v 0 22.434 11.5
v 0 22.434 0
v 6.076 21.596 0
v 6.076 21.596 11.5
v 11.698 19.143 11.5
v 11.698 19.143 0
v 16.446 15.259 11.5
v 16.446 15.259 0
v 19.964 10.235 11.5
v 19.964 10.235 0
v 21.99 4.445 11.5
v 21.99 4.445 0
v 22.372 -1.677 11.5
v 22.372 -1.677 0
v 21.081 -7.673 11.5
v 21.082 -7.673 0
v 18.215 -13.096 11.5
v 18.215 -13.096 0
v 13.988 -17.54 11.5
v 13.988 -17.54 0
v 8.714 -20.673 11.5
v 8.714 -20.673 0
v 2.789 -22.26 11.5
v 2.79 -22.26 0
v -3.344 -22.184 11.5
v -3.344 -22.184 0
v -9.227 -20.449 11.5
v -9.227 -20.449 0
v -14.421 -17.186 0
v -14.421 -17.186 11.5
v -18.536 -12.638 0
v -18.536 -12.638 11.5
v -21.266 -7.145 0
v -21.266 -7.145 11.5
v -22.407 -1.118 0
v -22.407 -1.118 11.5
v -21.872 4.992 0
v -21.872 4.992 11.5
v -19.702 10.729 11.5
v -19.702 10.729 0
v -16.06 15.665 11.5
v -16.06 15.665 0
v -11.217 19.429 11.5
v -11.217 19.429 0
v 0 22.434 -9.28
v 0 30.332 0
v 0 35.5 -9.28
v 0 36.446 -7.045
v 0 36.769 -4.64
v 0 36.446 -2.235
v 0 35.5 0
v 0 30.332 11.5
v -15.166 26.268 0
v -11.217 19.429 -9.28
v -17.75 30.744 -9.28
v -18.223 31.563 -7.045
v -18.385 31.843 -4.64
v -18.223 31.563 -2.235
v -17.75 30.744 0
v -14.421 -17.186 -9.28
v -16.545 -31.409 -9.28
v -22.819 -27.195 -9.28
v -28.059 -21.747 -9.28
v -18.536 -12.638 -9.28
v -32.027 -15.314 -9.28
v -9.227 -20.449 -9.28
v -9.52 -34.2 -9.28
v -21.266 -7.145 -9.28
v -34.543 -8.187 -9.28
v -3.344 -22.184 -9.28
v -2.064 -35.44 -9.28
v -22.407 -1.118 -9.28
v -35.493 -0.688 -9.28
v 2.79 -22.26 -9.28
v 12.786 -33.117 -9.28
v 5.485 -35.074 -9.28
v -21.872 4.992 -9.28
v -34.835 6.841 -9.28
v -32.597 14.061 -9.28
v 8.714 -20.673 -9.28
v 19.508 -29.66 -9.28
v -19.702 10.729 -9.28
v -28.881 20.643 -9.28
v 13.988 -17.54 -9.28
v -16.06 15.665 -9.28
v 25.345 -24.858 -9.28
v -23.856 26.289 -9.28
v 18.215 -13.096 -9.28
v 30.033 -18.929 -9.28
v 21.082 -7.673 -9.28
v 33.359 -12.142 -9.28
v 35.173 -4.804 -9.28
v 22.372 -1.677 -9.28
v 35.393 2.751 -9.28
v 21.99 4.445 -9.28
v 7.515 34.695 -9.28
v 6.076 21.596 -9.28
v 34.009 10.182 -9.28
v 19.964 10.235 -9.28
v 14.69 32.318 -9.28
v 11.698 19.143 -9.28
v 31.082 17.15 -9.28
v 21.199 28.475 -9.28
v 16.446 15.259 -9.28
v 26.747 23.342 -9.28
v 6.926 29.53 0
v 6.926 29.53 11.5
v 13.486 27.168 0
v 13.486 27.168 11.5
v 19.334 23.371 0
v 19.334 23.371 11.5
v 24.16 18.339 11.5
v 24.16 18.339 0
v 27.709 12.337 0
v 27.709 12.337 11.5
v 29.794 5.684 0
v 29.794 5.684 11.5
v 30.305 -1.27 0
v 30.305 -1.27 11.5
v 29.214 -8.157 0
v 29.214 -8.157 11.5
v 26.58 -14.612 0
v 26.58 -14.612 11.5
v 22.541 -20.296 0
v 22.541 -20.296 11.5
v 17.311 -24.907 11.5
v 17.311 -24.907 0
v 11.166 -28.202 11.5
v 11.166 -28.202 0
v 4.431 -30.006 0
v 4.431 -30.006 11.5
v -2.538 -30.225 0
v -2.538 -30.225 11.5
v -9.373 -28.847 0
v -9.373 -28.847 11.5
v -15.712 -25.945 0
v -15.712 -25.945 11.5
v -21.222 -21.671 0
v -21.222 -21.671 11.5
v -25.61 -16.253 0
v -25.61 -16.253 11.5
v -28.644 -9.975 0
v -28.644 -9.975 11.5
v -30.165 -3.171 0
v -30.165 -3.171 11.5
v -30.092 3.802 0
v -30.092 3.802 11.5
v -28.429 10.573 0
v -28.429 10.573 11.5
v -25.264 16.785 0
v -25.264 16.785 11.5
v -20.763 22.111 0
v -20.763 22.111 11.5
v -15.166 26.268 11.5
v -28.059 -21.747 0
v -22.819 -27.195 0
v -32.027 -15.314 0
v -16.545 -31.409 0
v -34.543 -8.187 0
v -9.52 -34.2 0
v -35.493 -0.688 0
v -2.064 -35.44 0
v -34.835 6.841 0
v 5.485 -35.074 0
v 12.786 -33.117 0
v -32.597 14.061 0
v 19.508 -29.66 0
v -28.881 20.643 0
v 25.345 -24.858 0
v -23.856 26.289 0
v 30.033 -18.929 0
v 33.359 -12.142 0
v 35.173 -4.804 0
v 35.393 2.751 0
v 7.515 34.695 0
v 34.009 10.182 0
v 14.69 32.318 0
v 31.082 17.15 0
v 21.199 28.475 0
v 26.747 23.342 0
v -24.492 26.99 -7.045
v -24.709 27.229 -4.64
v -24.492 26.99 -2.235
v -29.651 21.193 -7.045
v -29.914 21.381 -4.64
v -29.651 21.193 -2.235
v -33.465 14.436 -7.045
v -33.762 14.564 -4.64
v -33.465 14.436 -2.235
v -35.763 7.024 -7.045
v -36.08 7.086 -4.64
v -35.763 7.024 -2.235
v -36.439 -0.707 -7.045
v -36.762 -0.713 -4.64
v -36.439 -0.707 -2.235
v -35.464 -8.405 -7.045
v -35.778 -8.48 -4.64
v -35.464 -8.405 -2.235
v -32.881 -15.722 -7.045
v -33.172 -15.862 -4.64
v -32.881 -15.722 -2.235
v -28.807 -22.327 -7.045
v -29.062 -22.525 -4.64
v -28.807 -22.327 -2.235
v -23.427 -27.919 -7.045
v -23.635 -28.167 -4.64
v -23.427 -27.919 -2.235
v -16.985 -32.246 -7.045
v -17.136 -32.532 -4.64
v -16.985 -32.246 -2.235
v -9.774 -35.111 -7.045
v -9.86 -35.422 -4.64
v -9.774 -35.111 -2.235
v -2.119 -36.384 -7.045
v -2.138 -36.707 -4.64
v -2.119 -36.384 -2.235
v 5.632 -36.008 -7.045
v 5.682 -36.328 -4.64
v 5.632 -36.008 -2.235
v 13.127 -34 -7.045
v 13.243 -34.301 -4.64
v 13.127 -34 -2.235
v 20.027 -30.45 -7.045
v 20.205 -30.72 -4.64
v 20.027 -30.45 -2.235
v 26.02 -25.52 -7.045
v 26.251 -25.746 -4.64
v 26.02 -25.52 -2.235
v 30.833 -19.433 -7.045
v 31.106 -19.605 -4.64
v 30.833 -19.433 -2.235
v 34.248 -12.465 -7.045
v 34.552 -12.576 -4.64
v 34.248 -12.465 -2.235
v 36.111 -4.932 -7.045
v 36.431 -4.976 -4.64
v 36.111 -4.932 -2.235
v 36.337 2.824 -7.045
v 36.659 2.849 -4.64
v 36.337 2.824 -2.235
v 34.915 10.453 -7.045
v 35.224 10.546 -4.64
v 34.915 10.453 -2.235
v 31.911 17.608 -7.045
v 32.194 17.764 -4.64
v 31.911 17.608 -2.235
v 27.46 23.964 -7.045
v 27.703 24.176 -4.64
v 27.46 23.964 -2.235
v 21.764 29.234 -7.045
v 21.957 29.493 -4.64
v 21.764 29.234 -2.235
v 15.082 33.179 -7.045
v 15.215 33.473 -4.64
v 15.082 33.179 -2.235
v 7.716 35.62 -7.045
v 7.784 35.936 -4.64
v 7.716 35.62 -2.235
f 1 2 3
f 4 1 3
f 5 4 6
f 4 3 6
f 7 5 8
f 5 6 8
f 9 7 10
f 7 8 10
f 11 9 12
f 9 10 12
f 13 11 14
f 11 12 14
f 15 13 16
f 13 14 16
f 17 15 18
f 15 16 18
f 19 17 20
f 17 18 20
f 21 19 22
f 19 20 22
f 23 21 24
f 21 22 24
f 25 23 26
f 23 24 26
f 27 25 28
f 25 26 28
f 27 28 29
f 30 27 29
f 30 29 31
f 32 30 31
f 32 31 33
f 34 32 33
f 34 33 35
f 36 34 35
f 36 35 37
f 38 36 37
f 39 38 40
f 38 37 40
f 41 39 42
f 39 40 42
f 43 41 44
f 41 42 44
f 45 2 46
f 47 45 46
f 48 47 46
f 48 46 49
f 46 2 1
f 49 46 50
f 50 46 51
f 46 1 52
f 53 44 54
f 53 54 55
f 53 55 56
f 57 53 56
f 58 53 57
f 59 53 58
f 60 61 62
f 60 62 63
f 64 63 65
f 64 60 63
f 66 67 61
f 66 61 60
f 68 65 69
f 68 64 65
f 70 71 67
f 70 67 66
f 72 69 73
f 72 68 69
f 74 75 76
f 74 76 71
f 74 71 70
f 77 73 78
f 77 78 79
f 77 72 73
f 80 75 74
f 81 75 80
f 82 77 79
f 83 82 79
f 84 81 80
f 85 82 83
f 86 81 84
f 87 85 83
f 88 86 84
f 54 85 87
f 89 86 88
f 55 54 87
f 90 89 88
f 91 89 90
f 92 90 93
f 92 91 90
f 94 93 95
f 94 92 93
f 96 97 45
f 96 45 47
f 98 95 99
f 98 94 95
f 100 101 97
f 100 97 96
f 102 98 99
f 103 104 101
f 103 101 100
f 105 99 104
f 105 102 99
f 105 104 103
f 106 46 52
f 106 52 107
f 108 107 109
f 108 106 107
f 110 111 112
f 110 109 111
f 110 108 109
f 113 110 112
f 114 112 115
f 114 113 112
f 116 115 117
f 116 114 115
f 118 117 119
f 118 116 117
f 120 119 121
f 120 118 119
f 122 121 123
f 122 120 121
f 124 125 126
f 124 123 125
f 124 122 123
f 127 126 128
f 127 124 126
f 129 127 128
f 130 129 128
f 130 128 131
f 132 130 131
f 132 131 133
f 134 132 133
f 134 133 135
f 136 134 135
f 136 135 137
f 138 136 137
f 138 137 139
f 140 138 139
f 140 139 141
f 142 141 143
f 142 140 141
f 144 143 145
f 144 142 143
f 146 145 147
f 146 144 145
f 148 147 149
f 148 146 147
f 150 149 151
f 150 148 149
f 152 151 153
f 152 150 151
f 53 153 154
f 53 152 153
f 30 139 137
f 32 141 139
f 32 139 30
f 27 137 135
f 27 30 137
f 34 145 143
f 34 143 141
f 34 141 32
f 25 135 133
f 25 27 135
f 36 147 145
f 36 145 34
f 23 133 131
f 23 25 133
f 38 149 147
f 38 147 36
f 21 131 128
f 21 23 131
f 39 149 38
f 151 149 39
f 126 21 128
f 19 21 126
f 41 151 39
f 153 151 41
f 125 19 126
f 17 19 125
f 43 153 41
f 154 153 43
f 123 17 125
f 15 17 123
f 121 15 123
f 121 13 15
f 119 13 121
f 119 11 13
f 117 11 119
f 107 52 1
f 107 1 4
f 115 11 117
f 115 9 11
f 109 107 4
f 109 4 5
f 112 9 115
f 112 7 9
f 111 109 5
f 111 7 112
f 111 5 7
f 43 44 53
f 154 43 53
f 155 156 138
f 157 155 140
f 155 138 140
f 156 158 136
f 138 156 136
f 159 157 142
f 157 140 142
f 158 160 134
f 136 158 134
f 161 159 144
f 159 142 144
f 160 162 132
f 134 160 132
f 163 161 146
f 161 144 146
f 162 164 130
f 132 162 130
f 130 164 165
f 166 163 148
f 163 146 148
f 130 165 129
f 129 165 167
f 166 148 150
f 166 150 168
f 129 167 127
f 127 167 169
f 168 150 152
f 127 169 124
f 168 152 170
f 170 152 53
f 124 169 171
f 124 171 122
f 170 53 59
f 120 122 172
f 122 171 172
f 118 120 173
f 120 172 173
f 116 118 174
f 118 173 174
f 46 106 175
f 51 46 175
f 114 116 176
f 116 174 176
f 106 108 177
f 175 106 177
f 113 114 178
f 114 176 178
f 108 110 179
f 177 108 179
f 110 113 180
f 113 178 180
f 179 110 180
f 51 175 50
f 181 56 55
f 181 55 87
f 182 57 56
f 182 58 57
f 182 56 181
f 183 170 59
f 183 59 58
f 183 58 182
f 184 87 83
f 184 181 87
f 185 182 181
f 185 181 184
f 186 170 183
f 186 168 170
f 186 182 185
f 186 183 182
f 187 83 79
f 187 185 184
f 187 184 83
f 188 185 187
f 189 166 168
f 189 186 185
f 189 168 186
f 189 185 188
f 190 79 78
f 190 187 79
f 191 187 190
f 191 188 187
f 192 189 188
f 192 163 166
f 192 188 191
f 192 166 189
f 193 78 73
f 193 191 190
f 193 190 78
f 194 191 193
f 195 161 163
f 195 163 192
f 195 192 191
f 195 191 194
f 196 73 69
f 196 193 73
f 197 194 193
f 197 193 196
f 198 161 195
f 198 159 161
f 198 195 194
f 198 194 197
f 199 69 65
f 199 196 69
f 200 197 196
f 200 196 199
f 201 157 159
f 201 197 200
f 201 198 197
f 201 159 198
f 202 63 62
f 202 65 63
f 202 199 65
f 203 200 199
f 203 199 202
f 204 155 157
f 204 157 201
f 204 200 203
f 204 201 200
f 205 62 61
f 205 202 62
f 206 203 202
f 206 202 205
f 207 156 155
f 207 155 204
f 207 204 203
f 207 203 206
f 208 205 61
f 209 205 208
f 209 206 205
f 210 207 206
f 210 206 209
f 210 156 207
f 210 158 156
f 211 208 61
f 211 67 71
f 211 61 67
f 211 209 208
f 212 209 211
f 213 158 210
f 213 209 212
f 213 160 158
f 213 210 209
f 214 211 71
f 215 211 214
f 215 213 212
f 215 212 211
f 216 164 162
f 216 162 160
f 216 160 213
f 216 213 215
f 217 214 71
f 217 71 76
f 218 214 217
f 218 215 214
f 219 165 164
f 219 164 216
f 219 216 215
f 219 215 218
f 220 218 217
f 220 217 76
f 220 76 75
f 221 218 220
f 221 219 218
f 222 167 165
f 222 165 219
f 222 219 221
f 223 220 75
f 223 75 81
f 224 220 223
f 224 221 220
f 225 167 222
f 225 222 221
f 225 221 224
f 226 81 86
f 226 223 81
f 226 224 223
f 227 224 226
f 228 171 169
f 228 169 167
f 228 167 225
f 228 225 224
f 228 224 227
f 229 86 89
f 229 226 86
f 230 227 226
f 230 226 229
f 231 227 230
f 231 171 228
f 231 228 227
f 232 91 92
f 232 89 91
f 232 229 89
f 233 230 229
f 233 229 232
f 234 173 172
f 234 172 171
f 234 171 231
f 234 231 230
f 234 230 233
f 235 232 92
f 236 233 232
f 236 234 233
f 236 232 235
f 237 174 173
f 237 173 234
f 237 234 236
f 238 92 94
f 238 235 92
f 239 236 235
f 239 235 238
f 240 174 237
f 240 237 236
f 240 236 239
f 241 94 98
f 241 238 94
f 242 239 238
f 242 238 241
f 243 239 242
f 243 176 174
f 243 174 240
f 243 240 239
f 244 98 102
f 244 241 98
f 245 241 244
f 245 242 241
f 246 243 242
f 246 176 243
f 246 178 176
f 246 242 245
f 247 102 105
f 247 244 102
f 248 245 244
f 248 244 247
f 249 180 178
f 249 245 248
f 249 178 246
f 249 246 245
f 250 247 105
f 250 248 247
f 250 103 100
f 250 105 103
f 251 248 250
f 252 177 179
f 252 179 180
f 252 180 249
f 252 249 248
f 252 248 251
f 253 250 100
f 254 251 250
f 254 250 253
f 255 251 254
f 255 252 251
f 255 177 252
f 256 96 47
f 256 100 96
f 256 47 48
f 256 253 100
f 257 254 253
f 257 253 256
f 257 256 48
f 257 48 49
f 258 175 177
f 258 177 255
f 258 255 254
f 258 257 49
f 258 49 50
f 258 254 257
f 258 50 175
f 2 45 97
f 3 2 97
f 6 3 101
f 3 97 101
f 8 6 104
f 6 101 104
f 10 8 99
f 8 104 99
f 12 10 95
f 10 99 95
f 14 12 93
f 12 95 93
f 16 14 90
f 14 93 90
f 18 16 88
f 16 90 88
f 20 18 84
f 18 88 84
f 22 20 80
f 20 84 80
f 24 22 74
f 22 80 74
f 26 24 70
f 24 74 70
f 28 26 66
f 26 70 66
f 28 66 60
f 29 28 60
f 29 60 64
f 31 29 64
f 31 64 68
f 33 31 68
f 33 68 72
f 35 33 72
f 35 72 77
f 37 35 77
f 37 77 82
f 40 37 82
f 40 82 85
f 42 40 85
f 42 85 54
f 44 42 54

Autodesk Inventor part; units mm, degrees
ref_plane "YZ Plane" through (0, 0, 0) normal (1, 0, 0) x (0, 1, 0)
ref_plane "XZ Plane" through (0, 0, 0) normal (0, 1, 0) x (-1, 0, 0)
ref_plane "XY Plane" through (0, 0, 0) normal (0, 0, 1) x (1, 0, 0)
sketch "Sketch1" plane through (0, 0, 0) normal (1, 0, 0) x (0, 1, 0)
  line L0 (0, 0) -> (0, -41.9923)
  line L1 (35.5, 0) -> (22.4345, 0)
  line L2 (22.4345, 0) -> (22.4345, -9.2803)
  line L3 (22.4345, -9.2803) -> (35.5, -9.2803)
  arc A0 (35.5, -9.2803) -> (35.5, 0) centre (27.6519, -4.6401) ccw
revolve "Revolution1" add sketch "Sketch1" angle 330 about axis through (0, 0, 0) along (0, 0, -1)
sketch "Sketch2" plane through (0, 22.4345, 0) normal (0, 0, 1) x (1, 0, 0)
  arc A0 (-11.2172, -3.0056) -> (0, 0) centre (0, -22.4345) ccw projected
  arc A1 (-15.1658, 3.8334) -> (0, 7.8971) centre (0, -22.4345) ccw
  line L0 (-11.2172, -3.0056) -> (-15.1658, 3.8334)
  line L1 (-17.75, 8.3094) -> (-11.2172, -3.0056) projected
  line L2 (0, 7.8971) -> (0, 0)
  point P0 (0, -22.4345)
extrude "Extrusion1" add sketch "Sketch2" along normal blind 11.5
properties part number "SPRING SUPPORT"
